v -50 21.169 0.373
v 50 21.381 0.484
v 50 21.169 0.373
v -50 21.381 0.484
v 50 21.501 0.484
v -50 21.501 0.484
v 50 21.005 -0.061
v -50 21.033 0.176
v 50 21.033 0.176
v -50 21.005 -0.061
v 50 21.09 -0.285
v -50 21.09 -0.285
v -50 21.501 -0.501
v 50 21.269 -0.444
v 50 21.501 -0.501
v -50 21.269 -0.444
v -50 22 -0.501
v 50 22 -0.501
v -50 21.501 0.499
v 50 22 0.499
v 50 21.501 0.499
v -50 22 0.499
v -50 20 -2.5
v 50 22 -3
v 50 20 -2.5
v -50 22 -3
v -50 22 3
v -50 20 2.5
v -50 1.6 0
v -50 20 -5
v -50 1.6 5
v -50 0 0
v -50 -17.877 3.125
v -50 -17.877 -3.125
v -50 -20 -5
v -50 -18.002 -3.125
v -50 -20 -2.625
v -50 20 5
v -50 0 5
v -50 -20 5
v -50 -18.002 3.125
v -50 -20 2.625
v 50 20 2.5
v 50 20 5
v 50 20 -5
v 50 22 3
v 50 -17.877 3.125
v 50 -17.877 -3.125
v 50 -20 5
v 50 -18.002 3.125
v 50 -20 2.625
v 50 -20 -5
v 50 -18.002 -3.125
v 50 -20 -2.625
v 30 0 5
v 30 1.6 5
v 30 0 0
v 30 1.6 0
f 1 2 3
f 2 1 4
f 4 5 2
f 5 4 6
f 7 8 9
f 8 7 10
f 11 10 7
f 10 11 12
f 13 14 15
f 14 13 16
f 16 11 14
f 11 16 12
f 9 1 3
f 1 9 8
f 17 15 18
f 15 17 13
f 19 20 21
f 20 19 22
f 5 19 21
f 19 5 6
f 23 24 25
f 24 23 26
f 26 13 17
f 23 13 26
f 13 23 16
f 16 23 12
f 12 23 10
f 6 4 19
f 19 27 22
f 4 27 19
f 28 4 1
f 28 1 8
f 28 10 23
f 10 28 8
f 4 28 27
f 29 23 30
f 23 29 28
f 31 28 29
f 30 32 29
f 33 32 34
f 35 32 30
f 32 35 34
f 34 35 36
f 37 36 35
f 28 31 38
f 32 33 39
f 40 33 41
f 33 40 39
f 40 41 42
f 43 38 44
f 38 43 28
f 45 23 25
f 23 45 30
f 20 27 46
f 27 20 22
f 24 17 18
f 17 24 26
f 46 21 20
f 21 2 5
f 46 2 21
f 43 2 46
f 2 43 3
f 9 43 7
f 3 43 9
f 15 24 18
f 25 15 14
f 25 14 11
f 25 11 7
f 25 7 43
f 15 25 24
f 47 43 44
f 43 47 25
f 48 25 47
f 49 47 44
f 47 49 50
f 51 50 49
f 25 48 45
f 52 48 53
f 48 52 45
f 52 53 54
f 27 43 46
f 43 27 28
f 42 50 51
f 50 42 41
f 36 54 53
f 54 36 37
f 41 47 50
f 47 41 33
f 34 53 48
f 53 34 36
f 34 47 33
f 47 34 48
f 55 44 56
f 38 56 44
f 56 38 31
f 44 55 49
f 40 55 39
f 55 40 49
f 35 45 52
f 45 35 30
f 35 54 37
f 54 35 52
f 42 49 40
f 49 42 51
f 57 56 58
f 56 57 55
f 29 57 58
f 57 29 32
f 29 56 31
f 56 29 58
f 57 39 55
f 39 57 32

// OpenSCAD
// file: dovetail.scad
//male_dovetail(max_width=11, min_width=5, depth=5, height=30, cutout_width=5, cutout_depth=3.5)
//This produces a male dovetail with the dimensions specified. The cutout_width and depth specify the dimensions of a cutout in the center of the dovetail that will hopefully provide some spring or flex to allow them to go together tightly.
//
//female_dovetail((max_width=11, min_width=5, depth=5, height=30, block_width=15, block_depth=9, clearance=0.25)
//This produces a block of the specified dimensions with a dovetail cut out of it with an added clearance on three sides.
//
//female_dovetail_negative(max_width=11, min_width=5, depth=5, height=30, clearance=0.25)
//This produces the negative of the above module so that you can subtract it from an object.


module female_dovetail_negative(max_width=11, min_width=5, depth=5, height=30, clearance=0.25) {
	union() {
		translate([0,-0.001,-0.05])
			dovetail_3d(max_width+clearance,min_width+clearance,depth,height+0.1);
			translate([-(max_width+clearance)/2, depth-0.002,-0.5])
				cube([max_width+clearance,clearance/2,height+1]);
	}
}

module female_dovetail(max_width=11, min_width=5, depth=5, height=30, block_width=15, block_depth=9, clearance=0.25) {
		difference() {
			translate([-block_width/2,0,0]) cube([block_width, block_depth, height]);
			female_dovetail_negative(max_width, min_width, depth, height, clearance);
		}
}

module male_dovetail(max_width=11, min_width=51, depth=5, height=30, cutout_width=5, cutout_depth=3.5) {
	difference() {
		dovetail_3d(max_width,min_width,depth,height);
		translate([0.001,depth+0.001,-0.05])
			dovetail_cutout(cutout_width, cutout_depth, height+0.1);
	}
}

module dovetail_3d(max_width=11, min_width=5, depth=5, height=30) {
	linear_extrude(height=height, convexity=2)
		dovetail_2d(max_width,min_width,depth);
}

module dovetail_2d(max_width=11, min_width=5, depth=5) {
	angle=atan((max_width/2-min_width/2)/depth);
	echo("angle: ", angle);
	polygon(paths=[[0,1,2,3,0]], points=[[-min_width/2,0], [-max_width/2,depth], [max_width/2, depth], [min_width/2,0]]);
}

module dovetail_cutout(width=5, depth=4, height=30) {
	translate([0,-depth+width/2,0])
		union() {
			translate([-width/2,0,0])
				cube([width,depth-width/2,height]);
			difference() {
				cylinder(r=width/2, h=height, $fs=0.25);
				translate([-width/2-0.05,0.05,-0.05]) cube([width+0.1,width+0.1,height+0.1]);
			}
		}
}
// main file
include <dovetail.scad>;
//translate([0,-15,0]) 
//union() {
//    male_dovetail(max_width=10, min_width=8, depth=5, height=30, cutout_width=3, cutout_depth=4);
//    translate([-10,-5,0]) cube([20,5,30]);
//}

pcb_length = 80;
pcb_thickness = 1.6;

width = 40;
height = 10;
length = 100;

// temp
a = 10;

translate([-length/2,width/2,0])
rotate([0,90,0])
male_dovetail(max_width=6, min_width=5, depth=2, height=length, cutout_width=1, cutout_depth=1);
difference() {
    union() {
    translate([length/2,-(width/2),0])
    rotate([0,270,0])
    female_dovetail(max_width=6, min_width=5, depth=2, height=length, block_width=height, block_depth=a, clearance=0.25);
        translate([0,a/2,0])
        cube([length, width-a, height], center=true);
    }
    translate([-length/2,0,0])
    cube([pcb_length, pcb_thickness, height/2]);
}
